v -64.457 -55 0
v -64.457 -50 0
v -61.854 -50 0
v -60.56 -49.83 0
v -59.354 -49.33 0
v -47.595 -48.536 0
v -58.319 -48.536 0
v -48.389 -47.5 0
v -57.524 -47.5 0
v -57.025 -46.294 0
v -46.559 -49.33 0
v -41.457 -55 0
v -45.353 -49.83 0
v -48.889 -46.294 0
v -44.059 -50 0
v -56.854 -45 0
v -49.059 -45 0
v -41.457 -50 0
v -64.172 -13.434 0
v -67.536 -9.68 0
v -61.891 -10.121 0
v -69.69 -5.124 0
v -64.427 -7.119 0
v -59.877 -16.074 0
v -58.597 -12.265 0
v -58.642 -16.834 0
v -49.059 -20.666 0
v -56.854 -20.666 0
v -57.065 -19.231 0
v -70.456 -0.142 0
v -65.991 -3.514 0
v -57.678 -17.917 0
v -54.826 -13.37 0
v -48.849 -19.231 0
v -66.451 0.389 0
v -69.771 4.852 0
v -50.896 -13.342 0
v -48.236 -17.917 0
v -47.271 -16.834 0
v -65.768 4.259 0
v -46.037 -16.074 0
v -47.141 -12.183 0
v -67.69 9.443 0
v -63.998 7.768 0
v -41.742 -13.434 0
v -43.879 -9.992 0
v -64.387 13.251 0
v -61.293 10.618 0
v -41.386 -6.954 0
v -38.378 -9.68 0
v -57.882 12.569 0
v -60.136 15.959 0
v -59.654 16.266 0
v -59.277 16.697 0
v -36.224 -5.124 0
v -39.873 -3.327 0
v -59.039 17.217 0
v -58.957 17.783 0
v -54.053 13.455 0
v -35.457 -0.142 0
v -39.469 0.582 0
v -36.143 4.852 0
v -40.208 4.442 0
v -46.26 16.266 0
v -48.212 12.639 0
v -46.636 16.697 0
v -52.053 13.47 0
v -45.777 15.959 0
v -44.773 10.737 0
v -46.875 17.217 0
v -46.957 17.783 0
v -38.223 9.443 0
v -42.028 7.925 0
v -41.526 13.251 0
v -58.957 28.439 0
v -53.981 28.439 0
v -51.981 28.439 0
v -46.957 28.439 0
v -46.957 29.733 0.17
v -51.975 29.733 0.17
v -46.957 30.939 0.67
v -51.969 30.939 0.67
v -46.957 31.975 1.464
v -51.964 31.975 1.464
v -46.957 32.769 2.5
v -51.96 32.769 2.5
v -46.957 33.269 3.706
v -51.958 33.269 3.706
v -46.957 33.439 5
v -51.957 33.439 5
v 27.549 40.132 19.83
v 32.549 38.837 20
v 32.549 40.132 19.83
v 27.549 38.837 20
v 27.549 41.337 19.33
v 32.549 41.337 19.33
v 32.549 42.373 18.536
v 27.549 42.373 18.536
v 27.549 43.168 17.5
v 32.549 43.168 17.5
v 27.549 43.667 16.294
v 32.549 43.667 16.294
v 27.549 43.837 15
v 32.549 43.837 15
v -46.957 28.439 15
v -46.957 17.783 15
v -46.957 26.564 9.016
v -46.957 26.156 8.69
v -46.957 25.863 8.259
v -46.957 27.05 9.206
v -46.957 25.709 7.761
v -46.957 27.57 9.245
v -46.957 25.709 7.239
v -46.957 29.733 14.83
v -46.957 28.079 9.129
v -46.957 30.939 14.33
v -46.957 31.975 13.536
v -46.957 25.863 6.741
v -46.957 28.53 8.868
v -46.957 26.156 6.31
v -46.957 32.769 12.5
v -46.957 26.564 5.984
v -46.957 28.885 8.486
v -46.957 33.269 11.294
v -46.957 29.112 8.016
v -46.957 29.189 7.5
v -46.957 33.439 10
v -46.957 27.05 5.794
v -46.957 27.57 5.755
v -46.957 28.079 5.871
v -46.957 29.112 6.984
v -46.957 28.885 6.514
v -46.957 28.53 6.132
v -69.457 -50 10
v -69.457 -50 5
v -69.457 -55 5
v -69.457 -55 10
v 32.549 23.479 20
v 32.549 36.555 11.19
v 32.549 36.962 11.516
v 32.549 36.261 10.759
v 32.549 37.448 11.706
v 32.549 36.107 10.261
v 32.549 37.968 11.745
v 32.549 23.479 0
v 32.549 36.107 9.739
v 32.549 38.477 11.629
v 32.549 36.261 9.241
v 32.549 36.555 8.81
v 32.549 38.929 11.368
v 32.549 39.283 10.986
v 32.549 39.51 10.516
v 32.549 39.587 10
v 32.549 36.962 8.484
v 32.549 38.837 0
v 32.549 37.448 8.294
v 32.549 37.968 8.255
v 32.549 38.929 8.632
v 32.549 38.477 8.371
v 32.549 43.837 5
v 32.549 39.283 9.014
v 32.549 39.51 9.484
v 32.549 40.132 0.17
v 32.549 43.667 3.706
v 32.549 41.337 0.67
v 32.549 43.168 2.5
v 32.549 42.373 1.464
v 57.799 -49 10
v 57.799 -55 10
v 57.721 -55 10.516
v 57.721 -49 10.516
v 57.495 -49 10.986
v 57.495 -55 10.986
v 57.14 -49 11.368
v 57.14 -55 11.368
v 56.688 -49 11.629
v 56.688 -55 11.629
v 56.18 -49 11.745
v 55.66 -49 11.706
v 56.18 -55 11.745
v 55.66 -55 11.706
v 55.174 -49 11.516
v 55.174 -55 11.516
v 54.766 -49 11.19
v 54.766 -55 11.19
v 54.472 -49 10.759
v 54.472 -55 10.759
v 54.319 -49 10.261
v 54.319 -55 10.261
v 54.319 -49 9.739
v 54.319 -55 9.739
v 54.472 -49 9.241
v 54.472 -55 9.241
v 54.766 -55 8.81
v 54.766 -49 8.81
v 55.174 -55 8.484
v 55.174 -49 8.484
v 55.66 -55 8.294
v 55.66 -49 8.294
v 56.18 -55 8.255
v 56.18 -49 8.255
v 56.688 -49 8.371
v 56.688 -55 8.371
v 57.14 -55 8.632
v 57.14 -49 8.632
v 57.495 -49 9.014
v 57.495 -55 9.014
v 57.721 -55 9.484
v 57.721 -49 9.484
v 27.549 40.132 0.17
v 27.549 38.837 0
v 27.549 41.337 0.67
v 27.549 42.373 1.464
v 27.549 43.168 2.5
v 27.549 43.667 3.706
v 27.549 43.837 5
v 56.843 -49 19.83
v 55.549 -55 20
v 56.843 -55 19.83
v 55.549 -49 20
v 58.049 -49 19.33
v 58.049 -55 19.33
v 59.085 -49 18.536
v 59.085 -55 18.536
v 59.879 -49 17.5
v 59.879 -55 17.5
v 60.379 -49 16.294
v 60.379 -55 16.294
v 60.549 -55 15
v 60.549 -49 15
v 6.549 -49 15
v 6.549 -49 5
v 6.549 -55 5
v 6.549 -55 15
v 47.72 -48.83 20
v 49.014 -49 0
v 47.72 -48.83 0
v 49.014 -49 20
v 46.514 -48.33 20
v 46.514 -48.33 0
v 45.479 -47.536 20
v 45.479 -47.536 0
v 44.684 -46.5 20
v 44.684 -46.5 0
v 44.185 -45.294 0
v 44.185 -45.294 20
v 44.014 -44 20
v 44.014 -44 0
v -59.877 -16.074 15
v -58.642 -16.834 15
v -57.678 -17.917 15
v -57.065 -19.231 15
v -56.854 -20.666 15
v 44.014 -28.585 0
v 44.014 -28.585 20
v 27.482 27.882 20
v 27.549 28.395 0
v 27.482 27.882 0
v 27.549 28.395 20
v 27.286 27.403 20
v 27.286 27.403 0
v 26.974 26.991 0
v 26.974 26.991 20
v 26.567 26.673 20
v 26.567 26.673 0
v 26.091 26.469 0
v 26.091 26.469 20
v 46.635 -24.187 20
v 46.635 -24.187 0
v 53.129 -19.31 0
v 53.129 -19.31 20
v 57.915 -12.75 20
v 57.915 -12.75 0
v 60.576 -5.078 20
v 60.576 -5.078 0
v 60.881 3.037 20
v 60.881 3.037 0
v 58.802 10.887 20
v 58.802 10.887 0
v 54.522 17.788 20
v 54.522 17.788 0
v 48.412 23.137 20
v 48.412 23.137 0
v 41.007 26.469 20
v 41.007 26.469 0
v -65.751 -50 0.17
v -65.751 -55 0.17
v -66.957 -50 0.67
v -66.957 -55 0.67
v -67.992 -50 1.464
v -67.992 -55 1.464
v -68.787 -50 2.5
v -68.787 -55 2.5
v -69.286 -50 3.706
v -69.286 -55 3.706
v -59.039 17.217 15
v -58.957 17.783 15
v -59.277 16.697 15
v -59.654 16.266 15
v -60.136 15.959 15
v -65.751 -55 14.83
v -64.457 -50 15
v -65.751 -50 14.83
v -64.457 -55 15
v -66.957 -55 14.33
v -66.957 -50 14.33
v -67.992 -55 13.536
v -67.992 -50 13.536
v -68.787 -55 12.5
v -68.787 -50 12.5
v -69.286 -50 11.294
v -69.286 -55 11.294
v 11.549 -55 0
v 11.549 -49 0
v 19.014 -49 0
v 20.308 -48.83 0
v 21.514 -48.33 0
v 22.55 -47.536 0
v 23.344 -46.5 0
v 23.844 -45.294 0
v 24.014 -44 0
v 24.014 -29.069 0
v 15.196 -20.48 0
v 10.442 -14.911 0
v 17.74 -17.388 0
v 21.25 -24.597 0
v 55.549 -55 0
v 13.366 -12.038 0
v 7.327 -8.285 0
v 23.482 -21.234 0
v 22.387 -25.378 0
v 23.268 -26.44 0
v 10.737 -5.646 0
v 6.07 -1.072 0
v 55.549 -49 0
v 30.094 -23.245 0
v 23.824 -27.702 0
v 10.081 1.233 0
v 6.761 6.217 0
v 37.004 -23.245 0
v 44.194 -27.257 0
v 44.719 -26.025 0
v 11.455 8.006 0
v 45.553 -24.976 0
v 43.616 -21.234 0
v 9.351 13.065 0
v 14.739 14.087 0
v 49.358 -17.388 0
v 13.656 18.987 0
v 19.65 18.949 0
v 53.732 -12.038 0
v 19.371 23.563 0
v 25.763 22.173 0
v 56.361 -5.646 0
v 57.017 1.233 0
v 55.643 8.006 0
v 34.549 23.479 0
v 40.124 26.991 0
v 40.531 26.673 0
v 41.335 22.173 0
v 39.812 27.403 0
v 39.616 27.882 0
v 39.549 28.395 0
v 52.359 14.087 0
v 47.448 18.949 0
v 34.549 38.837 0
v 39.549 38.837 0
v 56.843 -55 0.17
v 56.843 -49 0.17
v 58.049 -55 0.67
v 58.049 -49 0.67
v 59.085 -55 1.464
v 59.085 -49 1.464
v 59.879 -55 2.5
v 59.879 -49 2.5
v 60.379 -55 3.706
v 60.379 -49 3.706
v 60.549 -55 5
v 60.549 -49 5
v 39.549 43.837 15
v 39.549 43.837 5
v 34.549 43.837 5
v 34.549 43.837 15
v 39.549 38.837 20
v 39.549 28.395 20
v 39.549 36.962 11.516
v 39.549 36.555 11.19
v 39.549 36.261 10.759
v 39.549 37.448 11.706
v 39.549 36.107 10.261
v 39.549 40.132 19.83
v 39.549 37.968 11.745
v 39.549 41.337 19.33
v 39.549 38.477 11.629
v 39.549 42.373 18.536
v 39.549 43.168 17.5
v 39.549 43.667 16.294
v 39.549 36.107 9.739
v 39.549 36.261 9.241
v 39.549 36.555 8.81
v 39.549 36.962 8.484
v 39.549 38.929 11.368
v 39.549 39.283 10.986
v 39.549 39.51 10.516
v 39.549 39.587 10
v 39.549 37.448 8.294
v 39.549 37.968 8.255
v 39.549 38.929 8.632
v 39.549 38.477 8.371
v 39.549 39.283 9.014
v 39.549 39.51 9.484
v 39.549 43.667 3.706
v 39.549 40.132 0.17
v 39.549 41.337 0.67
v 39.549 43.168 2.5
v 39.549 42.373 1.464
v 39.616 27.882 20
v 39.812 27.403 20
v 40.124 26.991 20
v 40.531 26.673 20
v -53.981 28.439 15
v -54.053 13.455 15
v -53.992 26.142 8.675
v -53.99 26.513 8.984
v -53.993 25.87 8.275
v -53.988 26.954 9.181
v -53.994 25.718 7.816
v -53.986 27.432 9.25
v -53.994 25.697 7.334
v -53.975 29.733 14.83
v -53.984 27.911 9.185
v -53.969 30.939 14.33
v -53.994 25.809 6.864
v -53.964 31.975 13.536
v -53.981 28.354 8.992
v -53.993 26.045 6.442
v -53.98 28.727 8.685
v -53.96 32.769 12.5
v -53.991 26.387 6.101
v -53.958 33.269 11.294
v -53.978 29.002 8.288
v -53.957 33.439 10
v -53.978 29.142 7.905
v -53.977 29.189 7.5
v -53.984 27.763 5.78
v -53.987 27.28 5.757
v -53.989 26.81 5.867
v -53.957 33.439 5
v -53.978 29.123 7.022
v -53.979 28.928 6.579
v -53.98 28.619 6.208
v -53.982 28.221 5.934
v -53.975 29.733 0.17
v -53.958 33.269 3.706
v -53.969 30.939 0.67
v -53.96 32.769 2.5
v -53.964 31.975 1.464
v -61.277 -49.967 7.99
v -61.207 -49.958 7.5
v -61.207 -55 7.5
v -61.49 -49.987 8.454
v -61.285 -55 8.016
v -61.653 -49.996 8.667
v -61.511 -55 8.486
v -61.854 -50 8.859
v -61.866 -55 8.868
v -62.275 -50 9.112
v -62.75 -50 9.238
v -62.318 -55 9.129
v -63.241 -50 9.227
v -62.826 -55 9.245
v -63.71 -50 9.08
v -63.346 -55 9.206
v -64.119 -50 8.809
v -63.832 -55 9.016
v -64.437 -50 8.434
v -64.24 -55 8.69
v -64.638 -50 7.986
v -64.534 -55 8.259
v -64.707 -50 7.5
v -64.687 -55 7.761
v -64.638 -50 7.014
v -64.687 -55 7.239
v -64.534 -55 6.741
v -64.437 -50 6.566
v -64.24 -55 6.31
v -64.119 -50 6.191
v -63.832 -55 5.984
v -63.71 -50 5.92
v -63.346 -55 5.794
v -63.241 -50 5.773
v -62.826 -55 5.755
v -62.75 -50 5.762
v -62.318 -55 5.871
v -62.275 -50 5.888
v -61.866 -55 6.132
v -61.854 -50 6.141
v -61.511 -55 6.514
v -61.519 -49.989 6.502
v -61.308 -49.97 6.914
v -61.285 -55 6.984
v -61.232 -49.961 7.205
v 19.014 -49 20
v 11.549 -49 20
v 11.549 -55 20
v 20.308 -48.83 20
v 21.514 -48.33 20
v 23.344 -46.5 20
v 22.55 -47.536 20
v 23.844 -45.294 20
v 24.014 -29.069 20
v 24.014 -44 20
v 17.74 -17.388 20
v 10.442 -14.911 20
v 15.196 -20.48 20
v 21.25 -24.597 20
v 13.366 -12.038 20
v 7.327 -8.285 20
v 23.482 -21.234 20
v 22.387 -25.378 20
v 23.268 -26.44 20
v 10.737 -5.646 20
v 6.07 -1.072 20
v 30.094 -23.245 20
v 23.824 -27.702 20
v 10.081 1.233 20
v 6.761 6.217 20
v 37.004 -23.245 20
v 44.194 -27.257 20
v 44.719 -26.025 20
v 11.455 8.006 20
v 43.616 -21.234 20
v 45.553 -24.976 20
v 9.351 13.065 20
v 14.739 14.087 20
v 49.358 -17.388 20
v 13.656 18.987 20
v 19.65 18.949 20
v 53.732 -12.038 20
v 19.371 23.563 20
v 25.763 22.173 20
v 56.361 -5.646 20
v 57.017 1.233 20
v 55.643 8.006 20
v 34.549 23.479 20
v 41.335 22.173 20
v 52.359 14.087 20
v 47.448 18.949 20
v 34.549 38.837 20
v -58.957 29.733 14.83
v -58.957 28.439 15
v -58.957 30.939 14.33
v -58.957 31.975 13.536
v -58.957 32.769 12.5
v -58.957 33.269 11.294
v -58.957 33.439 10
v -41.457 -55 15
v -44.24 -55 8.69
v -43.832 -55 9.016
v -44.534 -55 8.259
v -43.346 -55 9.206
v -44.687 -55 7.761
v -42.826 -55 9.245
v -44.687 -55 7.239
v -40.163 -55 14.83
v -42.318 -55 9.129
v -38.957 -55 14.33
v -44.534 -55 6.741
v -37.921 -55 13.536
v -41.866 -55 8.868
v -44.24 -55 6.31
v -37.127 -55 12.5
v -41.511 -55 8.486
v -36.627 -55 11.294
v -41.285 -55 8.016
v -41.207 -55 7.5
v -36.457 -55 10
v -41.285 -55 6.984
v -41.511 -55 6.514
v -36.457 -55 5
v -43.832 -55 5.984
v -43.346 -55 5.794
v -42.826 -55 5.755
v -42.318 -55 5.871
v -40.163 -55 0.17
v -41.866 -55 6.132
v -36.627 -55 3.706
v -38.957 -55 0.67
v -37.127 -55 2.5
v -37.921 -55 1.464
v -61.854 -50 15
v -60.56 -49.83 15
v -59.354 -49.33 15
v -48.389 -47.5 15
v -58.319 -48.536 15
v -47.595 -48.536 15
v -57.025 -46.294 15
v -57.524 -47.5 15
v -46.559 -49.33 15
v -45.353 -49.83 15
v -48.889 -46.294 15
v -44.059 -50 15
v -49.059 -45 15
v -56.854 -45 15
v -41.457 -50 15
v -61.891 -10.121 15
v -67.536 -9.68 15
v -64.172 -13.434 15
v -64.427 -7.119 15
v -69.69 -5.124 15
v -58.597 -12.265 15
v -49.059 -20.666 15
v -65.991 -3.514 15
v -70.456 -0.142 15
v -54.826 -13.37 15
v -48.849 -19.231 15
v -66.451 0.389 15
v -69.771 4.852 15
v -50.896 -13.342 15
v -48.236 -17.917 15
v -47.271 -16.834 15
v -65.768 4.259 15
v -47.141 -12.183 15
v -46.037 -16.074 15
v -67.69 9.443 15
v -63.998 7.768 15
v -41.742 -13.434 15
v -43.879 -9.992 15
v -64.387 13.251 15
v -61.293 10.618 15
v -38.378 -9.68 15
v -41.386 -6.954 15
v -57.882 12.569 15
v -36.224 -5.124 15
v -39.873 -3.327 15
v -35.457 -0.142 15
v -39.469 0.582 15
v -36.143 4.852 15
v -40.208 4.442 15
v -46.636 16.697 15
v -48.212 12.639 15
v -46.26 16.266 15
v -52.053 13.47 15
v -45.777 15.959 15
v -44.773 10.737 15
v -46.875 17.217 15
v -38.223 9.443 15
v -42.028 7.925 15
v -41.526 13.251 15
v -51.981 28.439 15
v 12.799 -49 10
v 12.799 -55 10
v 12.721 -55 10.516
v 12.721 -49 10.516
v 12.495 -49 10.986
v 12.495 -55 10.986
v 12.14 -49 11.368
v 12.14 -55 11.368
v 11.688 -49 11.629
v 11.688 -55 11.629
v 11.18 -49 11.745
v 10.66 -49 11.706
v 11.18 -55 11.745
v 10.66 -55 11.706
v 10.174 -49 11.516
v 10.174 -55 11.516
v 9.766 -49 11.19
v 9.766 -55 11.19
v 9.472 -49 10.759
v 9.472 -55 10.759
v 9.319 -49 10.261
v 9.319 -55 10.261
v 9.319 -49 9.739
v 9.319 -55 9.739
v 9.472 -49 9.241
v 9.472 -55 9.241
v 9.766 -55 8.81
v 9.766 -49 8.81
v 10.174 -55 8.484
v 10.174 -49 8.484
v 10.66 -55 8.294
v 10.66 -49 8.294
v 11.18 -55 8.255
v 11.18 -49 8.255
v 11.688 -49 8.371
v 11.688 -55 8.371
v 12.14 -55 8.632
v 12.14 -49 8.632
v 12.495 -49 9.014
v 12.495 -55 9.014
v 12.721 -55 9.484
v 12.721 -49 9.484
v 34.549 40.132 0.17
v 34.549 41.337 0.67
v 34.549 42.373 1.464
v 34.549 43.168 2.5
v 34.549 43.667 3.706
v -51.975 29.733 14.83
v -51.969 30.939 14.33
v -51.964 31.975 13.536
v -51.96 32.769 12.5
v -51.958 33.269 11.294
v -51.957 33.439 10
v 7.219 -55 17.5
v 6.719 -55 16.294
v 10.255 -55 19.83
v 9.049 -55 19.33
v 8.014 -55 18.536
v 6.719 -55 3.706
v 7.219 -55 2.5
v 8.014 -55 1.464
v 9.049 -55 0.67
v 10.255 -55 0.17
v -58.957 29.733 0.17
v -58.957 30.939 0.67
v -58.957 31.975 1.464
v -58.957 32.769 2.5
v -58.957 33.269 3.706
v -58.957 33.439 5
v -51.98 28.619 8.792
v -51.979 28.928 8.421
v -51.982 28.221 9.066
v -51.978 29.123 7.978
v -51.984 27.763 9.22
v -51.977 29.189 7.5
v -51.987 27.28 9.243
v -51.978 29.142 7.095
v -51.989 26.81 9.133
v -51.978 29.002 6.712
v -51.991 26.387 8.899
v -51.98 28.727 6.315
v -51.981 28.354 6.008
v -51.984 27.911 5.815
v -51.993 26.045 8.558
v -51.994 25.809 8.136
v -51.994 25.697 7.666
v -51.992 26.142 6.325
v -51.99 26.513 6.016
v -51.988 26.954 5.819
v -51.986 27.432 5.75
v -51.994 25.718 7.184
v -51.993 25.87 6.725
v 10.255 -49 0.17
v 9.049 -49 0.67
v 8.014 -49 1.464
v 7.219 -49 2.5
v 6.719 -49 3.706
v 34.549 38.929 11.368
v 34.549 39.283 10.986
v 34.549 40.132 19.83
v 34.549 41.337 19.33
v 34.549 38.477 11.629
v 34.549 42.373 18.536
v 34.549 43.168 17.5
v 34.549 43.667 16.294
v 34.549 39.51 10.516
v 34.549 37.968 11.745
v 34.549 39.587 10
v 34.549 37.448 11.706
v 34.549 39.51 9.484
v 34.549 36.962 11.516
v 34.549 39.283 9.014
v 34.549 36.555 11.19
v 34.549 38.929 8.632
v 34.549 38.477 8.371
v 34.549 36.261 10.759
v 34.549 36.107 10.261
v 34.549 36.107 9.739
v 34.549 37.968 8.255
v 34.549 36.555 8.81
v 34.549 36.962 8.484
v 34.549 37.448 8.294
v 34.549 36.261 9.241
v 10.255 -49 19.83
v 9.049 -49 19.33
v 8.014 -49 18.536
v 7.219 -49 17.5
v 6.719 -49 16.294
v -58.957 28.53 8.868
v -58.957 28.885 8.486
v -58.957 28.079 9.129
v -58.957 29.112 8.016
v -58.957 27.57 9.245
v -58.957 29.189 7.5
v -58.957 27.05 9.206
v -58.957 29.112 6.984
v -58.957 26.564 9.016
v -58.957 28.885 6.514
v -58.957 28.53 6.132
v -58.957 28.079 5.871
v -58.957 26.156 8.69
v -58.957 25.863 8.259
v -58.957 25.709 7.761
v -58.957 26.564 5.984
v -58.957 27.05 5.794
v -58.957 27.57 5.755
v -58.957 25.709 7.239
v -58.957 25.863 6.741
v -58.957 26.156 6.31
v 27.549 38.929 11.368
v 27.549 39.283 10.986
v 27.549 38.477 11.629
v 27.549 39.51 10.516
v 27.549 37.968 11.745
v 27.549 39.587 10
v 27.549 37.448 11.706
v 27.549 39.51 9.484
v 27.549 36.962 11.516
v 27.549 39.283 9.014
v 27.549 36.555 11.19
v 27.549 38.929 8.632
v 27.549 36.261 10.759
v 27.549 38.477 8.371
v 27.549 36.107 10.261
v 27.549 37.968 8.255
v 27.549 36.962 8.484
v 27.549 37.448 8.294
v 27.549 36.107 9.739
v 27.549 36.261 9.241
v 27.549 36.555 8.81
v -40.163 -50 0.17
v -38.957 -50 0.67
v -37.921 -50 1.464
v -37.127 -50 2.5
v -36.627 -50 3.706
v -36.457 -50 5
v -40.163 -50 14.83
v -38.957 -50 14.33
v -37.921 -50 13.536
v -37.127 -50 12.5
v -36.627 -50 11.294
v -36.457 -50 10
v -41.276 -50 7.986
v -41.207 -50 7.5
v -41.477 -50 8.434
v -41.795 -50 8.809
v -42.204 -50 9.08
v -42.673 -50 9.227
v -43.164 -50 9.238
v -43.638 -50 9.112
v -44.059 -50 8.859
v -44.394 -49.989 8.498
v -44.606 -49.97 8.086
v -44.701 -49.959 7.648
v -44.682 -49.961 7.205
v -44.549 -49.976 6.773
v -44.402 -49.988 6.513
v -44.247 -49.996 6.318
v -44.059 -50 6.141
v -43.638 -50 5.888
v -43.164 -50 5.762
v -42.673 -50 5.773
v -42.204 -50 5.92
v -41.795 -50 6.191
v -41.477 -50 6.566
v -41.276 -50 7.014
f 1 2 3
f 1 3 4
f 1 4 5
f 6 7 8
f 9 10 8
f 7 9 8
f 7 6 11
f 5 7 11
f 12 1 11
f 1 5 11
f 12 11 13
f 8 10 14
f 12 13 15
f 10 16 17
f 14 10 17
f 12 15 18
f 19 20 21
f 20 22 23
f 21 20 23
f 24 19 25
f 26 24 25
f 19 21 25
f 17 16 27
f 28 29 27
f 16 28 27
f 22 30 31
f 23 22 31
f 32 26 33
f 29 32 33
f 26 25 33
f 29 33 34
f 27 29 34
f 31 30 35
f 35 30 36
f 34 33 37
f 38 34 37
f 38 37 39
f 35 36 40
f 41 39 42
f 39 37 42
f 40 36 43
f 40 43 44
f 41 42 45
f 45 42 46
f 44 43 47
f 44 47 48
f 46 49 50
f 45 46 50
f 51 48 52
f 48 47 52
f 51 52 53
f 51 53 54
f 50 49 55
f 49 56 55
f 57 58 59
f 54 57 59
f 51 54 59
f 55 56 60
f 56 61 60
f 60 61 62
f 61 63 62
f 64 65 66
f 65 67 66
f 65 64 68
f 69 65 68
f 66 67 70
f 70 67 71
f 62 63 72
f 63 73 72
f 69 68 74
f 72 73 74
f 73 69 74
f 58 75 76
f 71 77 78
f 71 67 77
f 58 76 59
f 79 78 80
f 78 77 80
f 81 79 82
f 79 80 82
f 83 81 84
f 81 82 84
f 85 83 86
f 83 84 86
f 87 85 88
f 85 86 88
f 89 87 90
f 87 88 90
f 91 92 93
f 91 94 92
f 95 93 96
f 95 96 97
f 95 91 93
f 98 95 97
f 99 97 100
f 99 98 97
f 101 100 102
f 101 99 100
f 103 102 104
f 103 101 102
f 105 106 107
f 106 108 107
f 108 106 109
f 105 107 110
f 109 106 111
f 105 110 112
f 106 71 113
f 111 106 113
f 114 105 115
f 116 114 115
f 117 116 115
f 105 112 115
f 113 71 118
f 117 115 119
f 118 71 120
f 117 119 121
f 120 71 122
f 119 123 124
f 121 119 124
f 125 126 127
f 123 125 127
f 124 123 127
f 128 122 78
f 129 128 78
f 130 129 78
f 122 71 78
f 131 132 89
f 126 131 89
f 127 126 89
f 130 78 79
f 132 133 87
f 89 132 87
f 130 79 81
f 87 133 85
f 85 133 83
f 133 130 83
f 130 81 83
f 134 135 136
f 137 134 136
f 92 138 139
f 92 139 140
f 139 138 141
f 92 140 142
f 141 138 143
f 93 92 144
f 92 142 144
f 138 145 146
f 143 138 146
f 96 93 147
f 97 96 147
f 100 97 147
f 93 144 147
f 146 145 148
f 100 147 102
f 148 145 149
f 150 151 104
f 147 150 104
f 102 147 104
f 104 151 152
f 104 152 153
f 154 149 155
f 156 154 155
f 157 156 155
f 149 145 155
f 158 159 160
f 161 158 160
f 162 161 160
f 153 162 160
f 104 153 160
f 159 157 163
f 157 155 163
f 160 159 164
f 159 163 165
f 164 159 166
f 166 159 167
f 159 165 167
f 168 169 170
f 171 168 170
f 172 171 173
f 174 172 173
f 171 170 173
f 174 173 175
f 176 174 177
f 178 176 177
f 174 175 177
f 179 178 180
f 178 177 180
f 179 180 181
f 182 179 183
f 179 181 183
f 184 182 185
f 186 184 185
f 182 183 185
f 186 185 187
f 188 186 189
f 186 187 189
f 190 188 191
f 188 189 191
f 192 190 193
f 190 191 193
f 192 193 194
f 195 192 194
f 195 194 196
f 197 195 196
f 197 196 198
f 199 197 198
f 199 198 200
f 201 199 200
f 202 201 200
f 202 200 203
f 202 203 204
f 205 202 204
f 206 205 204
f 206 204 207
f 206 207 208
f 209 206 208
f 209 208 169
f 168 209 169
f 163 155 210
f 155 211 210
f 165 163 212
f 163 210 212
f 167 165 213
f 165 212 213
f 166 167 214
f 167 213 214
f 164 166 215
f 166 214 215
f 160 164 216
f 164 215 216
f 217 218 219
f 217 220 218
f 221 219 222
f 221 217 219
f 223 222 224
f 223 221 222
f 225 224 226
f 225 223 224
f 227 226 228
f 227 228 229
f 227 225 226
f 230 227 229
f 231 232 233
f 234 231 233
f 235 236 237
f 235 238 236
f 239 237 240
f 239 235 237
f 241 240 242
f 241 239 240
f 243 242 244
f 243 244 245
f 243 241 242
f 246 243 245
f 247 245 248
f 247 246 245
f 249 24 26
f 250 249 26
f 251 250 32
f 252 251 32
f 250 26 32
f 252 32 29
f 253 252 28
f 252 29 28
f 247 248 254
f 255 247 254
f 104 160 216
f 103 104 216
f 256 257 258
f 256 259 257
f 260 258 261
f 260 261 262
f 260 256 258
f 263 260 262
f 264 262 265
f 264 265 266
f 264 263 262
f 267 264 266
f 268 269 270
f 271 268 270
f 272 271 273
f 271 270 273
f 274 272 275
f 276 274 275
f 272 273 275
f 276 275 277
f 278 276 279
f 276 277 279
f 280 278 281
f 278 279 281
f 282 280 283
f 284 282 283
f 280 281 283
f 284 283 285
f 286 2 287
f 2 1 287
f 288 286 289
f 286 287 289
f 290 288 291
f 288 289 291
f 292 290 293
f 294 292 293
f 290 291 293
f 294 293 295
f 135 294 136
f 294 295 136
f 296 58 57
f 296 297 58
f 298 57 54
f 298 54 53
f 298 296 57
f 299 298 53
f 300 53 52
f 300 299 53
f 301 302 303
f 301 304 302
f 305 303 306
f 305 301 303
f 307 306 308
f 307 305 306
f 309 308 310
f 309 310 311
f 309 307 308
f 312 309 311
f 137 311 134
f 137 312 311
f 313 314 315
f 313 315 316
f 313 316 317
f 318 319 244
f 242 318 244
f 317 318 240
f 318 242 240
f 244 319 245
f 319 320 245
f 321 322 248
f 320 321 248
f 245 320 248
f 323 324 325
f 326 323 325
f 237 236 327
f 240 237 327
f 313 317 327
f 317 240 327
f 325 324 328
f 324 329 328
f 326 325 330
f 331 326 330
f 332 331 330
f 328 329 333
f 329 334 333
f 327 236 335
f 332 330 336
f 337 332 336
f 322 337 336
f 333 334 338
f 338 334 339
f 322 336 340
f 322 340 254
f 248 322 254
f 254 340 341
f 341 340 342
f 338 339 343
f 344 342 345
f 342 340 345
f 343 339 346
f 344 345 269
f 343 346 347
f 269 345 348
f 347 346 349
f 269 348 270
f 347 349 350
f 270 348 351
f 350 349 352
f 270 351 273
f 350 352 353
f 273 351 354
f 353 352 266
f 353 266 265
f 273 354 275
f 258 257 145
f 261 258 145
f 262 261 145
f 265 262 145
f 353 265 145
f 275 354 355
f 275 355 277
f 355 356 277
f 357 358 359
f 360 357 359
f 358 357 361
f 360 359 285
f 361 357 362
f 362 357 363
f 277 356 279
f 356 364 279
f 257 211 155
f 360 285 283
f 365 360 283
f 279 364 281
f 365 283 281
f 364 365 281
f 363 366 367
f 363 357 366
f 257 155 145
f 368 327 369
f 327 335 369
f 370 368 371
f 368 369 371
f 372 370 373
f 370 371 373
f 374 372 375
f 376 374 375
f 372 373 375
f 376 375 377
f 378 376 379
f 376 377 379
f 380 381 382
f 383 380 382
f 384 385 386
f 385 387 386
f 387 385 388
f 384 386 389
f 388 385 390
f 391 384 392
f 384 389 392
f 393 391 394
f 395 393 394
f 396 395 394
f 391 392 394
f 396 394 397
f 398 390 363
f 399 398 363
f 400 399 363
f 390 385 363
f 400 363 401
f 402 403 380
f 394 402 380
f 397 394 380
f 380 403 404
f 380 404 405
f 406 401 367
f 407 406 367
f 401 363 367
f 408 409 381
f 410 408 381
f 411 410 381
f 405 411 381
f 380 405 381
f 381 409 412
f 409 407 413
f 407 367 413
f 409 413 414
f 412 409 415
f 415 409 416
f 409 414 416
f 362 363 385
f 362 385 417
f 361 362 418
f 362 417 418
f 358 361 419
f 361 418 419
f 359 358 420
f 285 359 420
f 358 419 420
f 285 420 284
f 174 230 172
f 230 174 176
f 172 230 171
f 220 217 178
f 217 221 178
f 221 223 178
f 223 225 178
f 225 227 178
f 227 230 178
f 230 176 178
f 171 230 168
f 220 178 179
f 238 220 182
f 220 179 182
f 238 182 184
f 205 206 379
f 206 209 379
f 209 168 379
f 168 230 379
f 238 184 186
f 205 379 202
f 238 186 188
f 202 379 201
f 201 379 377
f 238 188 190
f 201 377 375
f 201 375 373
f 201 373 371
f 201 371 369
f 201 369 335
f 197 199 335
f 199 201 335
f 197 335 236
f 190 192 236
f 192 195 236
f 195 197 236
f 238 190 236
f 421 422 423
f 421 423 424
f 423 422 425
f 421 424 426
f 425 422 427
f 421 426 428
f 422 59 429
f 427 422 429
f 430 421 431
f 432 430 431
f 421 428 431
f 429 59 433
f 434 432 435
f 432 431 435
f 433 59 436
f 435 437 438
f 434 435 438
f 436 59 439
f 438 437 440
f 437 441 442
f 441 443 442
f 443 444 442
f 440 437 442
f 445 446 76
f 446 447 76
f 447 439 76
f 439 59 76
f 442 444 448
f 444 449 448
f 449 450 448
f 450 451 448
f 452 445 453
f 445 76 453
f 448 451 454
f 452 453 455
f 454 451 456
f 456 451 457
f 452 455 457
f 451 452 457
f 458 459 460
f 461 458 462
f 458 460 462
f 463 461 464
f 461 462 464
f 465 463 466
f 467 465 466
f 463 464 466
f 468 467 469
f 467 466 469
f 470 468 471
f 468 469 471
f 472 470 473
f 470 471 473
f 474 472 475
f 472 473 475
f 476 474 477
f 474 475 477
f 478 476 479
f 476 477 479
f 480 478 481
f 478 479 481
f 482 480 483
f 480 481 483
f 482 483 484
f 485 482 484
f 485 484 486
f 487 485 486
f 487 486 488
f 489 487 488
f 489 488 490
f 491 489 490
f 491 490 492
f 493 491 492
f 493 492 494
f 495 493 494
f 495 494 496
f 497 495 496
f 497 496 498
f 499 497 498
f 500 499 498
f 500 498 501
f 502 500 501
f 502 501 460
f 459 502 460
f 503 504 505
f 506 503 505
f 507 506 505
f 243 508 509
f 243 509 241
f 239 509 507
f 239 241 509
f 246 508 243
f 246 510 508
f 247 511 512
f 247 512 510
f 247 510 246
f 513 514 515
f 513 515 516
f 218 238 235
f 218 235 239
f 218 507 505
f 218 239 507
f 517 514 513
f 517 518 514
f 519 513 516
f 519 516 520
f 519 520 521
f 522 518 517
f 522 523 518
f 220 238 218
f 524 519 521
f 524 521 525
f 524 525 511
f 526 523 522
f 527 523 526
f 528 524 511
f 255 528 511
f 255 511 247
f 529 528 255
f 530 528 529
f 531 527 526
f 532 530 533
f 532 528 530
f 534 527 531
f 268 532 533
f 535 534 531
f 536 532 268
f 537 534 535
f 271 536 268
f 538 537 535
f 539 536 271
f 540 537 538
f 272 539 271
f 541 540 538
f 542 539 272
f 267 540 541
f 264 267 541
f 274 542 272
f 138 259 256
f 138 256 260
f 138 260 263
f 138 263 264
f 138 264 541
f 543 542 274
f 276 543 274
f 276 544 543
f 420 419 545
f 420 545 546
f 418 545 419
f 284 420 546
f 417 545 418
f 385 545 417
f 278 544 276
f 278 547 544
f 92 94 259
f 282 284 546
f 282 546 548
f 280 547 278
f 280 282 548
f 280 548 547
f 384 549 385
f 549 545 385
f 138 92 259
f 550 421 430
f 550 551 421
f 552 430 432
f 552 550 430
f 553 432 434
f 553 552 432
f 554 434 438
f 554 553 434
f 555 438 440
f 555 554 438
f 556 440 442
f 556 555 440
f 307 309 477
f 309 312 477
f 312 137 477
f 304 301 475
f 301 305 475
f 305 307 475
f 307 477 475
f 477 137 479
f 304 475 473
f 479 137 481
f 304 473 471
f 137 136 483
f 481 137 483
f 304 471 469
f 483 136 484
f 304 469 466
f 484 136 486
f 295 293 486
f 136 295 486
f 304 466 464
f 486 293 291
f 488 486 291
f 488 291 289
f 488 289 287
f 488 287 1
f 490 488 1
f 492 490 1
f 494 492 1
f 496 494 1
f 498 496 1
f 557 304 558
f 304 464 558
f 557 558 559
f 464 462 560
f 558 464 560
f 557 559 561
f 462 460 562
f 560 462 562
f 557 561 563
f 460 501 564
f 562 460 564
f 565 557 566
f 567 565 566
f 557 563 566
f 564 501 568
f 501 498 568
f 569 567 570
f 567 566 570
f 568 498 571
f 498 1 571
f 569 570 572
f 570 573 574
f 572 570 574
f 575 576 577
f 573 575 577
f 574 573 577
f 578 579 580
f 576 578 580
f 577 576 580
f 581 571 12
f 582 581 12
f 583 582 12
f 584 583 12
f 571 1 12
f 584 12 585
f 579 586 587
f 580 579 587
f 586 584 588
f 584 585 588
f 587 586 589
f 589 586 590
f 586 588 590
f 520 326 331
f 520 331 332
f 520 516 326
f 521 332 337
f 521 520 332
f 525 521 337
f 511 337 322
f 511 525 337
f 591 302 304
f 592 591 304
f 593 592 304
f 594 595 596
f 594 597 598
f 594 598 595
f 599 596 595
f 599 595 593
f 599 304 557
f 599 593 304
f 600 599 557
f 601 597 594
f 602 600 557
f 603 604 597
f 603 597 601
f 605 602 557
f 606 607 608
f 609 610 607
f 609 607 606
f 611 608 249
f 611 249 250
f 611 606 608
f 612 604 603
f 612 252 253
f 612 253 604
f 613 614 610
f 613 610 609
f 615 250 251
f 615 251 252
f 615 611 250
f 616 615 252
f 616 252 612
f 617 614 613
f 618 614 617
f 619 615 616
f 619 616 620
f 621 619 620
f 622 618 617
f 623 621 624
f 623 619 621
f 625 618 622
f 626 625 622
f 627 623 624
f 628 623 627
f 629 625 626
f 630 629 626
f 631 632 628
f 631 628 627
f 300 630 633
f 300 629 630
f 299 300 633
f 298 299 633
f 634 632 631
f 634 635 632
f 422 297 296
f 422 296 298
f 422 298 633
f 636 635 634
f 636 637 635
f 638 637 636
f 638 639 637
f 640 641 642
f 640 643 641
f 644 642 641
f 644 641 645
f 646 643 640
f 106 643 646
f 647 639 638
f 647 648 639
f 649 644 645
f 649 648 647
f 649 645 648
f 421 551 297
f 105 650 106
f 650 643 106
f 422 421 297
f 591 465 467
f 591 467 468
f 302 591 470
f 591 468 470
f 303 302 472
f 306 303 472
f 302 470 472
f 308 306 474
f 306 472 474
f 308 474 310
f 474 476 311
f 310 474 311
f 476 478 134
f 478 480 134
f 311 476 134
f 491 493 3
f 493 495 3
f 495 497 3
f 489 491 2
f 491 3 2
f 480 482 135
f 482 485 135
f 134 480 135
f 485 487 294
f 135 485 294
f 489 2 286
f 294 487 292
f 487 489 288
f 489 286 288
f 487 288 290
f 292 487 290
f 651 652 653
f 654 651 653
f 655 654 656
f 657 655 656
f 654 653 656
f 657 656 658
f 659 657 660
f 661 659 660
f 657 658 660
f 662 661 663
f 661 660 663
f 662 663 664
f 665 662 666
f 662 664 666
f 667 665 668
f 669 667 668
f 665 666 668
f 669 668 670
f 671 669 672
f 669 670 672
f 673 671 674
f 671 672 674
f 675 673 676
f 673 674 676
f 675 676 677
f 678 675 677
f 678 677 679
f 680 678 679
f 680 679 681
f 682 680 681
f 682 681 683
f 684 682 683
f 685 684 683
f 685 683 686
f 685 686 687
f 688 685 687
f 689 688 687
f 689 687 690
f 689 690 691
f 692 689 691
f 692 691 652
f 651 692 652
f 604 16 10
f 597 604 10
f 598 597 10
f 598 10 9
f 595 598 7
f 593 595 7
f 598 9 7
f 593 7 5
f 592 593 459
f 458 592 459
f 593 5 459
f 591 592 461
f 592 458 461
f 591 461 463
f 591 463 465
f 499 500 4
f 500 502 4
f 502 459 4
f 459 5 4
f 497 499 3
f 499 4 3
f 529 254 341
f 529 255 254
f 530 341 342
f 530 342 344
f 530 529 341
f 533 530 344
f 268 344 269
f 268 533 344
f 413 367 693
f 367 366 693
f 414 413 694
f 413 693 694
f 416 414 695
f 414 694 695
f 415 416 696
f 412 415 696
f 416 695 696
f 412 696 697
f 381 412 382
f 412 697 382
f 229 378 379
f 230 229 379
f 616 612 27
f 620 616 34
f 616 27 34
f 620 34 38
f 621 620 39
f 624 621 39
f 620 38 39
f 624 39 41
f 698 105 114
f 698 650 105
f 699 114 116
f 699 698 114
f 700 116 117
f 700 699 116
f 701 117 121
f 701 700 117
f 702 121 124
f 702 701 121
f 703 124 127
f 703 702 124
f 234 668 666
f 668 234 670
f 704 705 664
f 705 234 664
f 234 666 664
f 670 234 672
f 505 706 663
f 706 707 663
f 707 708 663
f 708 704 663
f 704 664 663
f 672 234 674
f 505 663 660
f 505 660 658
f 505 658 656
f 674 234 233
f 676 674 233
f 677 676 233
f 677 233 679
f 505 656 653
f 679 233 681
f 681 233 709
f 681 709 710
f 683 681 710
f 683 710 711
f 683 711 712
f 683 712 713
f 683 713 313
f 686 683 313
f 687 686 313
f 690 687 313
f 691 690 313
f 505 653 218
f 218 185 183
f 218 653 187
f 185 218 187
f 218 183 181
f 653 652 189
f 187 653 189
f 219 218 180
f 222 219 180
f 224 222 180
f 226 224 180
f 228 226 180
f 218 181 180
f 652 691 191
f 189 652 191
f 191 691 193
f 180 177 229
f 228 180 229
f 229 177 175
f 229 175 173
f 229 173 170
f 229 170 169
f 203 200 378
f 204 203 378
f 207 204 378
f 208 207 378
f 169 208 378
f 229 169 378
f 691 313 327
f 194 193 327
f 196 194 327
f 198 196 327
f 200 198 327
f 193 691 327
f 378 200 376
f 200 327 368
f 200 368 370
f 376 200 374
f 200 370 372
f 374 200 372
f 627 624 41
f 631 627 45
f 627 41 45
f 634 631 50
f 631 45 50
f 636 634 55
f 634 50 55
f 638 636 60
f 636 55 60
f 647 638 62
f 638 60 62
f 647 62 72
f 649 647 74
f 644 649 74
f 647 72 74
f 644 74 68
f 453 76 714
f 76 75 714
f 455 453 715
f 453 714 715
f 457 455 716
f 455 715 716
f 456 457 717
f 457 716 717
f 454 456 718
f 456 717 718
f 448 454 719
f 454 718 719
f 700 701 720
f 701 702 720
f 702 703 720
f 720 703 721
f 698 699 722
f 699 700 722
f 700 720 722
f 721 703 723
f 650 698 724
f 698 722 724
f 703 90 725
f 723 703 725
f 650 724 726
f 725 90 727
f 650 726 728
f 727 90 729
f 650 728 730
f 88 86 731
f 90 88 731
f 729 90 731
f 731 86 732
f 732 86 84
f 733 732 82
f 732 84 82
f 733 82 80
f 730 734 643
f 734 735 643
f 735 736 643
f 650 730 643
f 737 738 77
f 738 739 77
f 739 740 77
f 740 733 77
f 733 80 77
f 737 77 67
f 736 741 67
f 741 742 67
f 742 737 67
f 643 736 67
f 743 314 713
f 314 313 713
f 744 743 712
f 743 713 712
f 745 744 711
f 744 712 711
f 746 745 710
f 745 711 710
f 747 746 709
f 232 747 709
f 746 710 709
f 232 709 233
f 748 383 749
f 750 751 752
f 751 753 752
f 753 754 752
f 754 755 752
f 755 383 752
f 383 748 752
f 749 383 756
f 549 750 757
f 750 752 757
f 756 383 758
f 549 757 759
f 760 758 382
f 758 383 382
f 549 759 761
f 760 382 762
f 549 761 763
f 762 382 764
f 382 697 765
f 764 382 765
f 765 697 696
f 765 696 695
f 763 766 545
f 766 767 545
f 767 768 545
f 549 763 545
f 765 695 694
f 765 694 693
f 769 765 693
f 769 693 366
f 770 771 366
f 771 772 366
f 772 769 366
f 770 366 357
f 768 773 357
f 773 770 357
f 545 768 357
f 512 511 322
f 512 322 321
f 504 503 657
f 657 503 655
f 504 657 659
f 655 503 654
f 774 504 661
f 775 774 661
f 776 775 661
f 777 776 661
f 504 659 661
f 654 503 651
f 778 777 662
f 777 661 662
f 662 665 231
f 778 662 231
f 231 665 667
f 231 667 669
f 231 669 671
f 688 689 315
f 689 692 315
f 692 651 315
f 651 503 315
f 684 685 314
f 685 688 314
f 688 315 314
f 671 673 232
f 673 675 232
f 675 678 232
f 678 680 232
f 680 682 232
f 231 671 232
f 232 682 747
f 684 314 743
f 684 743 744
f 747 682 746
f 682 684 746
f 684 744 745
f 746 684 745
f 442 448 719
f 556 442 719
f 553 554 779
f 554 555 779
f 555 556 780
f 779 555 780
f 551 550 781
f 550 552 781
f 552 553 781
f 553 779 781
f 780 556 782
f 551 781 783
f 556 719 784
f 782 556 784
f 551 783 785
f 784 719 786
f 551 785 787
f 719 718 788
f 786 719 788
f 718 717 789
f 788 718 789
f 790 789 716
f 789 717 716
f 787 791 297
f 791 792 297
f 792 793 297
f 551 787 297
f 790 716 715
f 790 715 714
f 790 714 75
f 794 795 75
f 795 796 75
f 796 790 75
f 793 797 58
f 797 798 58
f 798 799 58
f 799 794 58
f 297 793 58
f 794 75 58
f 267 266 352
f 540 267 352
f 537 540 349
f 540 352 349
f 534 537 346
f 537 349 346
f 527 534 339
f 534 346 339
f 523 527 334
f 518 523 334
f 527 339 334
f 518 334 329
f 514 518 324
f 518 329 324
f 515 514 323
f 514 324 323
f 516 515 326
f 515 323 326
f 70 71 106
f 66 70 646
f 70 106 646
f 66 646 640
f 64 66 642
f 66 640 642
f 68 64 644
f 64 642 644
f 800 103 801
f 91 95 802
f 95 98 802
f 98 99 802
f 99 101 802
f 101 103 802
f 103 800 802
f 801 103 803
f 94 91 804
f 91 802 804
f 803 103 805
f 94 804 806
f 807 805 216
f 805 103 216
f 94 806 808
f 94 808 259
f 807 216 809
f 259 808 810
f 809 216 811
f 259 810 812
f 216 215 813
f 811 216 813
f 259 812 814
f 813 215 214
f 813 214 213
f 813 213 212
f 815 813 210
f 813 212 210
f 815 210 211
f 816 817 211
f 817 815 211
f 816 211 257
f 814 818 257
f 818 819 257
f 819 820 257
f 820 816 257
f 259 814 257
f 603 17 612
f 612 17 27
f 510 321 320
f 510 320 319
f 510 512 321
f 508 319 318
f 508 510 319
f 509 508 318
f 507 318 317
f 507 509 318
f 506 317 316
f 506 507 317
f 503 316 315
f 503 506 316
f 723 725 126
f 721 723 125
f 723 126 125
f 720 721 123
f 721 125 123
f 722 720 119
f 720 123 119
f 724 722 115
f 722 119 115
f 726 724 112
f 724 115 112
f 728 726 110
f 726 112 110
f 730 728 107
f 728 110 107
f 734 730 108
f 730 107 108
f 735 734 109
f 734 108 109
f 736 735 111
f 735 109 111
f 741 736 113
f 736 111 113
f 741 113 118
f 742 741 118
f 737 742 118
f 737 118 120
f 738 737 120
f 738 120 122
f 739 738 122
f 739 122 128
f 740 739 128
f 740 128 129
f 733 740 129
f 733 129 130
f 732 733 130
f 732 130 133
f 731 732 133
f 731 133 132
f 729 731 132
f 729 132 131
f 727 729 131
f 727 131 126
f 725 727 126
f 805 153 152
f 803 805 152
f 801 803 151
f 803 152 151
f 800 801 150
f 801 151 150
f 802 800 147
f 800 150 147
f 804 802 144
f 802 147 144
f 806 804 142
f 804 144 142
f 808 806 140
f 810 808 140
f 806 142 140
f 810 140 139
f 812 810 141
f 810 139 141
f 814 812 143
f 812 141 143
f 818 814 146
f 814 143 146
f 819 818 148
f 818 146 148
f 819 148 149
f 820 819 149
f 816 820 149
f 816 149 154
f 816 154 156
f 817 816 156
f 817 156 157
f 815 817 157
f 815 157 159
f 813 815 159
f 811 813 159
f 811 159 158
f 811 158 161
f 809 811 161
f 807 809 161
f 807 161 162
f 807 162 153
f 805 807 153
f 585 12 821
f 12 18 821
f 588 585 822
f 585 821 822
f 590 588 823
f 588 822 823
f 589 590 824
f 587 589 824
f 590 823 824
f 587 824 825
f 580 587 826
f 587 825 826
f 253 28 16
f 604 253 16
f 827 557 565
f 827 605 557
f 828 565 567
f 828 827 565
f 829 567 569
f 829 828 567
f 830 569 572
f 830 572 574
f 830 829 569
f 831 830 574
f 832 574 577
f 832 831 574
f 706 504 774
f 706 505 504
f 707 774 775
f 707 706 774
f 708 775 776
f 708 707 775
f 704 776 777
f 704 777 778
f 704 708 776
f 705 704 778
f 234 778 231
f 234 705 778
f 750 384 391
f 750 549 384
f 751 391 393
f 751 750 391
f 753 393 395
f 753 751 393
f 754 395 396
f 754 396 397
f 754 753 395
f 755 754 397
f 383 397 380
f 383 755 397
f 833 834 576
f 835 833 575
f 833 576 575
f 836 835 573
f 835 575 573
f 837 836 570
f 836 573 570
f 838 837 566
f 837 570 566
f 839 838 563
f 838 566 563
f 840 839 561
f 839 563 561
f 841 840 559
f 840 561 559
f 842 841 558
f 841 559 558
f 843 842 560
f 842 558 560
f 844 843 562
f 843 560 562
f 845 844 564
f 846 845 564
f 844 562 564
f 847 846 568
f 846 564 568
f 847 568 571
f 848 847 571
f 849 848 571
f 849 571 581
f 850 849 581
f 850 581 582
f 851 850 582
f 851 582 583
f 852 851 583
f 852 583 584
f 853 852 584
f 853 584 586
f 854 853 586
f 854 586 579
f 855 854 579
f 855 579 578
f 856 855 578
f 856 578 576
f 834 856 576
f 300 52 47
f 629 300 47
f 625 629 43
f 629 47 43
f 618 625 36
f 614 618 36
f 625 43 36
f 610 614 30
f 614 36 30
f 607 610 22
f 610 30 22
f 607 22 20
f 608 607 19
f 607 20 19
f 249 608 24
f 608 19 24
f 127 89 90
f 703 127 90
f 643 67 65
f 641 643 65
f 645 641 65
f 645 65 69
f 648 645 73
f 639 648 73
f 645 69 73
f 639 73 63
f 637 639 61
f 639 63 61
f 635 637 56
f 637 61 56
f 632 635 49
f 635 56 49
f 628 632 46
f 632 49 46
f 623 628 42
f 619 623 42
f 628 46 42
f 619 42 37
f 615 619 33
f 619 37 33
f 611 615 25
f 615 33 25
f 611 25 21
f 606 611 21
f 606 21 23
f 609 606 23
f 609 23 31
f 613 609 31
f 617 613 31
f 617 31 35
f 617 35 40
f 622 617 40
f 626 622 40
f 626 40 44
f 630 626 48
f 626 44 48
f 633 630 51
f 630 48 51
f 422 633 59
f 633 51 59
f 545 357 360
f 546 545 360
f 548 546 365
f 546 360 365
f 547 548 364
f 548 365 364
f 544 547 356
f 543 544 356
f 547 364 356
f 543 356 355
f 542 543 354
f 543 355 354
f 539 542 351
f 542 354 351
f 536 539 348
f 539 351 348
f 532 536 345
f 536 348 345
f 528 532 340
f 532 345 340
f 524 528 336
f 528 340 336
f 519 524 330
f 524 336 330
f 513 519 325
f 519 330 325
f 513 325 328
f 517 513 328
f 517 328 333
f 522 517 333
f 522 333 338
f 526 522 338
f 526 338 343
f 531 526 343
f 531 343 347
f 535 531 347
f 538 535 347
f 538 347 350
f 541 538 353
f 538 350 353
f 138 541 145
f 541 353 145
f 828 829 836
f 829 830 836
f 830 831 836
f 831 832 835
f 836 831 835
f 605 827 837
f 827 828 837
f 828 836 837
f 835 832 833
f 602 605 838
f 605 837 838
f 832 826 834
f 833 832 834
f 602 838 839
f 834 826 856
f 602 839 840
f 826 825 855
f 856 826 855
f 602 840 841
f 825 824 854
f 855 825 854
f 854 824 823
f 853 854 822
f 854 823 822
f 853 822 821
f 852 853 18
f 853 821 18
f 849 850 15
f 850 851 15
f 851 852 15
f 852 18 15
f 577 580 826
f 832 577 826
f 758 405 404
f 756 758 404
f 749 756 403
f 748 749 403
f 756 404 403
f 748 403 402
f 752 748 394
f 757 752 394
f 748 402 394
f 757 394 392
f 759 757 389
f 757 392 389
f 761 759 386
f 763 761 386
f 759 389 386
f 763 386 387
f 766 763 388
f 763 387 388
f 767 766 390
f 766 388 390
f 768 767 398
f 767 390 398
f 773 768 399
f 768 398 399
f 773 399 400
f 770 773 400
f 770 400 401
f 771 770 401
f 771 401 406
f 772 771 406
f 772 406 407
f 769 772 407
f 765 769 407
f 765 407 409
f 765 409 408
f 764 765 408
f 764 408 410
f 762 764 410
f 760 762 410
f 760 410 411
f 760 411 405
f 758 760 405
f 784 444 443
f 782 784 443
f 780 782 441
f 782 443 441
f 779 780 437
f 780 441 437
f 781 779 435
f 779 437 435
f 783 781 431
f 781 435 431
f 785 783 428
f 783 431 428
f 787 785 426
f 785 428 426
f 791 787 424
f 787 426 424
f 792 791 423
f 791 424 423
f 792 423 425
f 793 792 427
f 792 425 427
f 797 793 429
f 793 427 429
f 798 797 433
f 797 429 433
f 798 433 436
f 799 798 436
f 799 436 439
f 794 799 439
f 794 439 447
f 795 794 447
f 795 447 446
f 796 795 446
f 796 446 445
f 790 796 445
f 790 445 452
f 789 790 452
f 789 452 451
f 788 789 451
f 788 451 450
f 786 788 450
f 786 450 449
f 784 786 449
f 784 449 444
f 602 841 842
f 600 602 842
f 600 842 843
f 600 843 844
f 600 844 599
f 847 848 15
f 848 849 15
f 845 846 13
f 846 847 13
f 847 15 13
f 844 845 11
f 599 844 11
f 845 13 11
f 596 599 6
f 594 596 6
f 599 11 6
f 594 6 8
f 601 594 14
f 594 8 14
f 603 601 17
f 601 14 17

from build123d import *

# Parameters (mm, degrees)
F1_DEPTH  = 15
F2_R      = 1.75
F3_DEPTH  = 25
F4_R      = 1.75
F5_DEPTH  = 25
F6_R      = 5
F8_DEPTH  = 20
F9_R      = 1.75
F10_DEPTH = 25
F11_R     = 1.75
F12_DEPTH = 25
F13_R     = 5
F14_R     = 2
F14_2_R   = 2
F15_R     = 5


with BuildPart() as f1:
    # F0 (on Top) → F1 (new body)
    with BuildSketch(Plane.XY):
        with BuildLine():
            ThreePointArc((-52.053306, 13.469729), (-52.860094, -13.499653), (-54.053375, 13.455394))
            Line((-54.053375, 13.455394), (-53.95685, 33.439282))
            Line((-53.95685, 33.439282), (-58.95685, 33.439282))
            Line((-58.95685, 33.439282), (-58.95685, 16.439282))
            ThreePointArc((-58.95685, 16.439282), (-70.449843, 0.495167), (-59.877178, -16.073552))
            ThreePointArc((-59.877178, -16.073552), (-57.677922, -17.917012), (-56.854415, -20.665995))
            Line((-56.854415, -20.665995), (-56.854415, -45))
            ThreePointArc((-56.854415, -45), (-58.318881, -48.535534), (-61.854415, -50))
            Line((-61.854415, -50), (-69.45685, -50))
            Line((-69.45685, -50), (-69.45685, -55))
            Line((-69.45685, -55), (-36.45685, -55))
            Line((-36.45685, -55), (-36.45685, -50))
            Line((-36.45685, -50), (-44.059286, -50))
            ThreePointArc((-44.059286, -50), (-47.59482, -48.535534), (-49.059286, -45))
            Line((-49.059286, -45), (-49.059286, -20.665995))
            ThreePointArc((-49.059286, -20.665995), (-48.235778, -17.917012), (-46.036522, -16.073552))
            ThreePointArc((-46.036522, -16.073552), (-35.463857, 0.495167), (-46.95685, 16.439282))
            Line((-46.95685, 16.439282), (-46.95685, 33.439282))
            Line((-46.95685, 33.439282), (-51.95685, 33.439282))
            Line((-51.95685, 33.439282), (-52.053306, 13.469729))
        make_face()
    extrude(amount=F1_DEPTH)

    # F2 (on face) → F3 (cut)
    with BuildSketch(Plane.XZ.offset(55)):
        with Locations((-62.95685, 7.5)):
            Circle(F2_R)
        with Locations((-42.95685, 7.5)):
            Circle(F2_R)
    extrude(amount=-F3_DEPTH, mode=Mode.SUBTRACT)

    # F4 (on face) → F5 (cut)
    with BuildSketch(Plane.YZ.offset(-46.95685)):
        with Locations((27.439282, 7.5)):
            Circle(F4_R)
    extrude(amount=-F5_DEPTH, mode=Mode.SUBTRACT)

    # F6
    f6_edges = [f1.edges().sort_by_distance(p)[0] for p in [
        (-49.45685, 33.439282, 15),
        (-56.45685, 33.439282, 15),
        (-49.45685, 33.439282, 0),
        (-56.45685, 33.439282, 0),
        (-36.45685, -52.5, 15),
        (-36.45685, -52.5, 0),
        (-69.45685, -52.5, 15),
        (-69.45685, -52.5, 0),
    ]]
    fillet(f6_edges, radius=F6_R)

    # F14#2
    f14_2_edges = [f1.edges().sort_by_distance(p)[0] for p in [
        (-58.95685, 16.439282, 7.5),
        (-46.95685, 16.439282, 7.5),
    ]]
    fillet(f14_2_edges, radius=F14_2_R)


with BuildPart() as f8:
    # F7 (on Top) → F8 (new body)
    with BuildSketch(Plane.XY):
        with BuildLine():
            ThreePointArc((34.54904, 23.478714), (33.54904, -23.5), (32.54904, 23.478714))
            Line((32.54904, 23.478714), (32.54904, 43.837474))
            Line((32.54904, 43.837474), (27.54904, 43.837474))
            Line((27.54904, 43.837474), (27.54904, 26.837474))
            ThreePointArc((27.54904, 26.837474), (6.110848, 1.842729), (24.014337, -25.794175))
            ThreePointArc((24.014337, -25.794175), (34.048544, -27.495463), (44.014337, -25.430839))
            ThreePointArc((44.014337, -25.430839), (60.949234, 2.340807), (39.54904, 26.837474))
            Line((39.54904, 26.837474), (39.54904, 43.837474))
            Line((39.54904, 43.837474), (34.54904, 43.837474))
            Line((34.54904, 43.837474), (34.54904, 23.478714))
        make_face()
        with BuildLine():
            ThreePointArc((44.014337, -25.430839), (34.048544, -27.495463), (24.014337, -25.794175))
            Line((24.014337, -25.794175), (24.014337, -49))
            Line((24.014337, -49), (6.54904, -49))
            Line((6.54904, -49), (6.54904, -55))
            Line((6.54904, -55), (60.54904, -55))
            Line((60.54904, -55), (60.54904, -49))
            Line((60.54904, -49), (44.014337, -49))
            Line((44.014337, -49), (44.014337, -25.430839))
        make_face()
    extrude(amount=F8_DEPTH)

    # F9 (on face) → F10 (cut)
    with BuildSketch(Plane.YZ.offset(39.54904)):
        with Locations((37.837474, 10)):
            Circle(F9_R)
    extrude(amount=-F10_DEPTH, mode=Mode.SUBTRACT)

    # F11 (on face) → F12 (cut)
    with BuildSketch(Plane.XZ.offset(55)):
        with Locations((56.04904, 10)):
            Circle(F11_R)
        with Locations((11.04904, 10)):
            Circle(F11_R)
    extrude(amount=-F12_DEPTH, mode=Mode.SUBTRACT)

    # F13
    f13_edges = [f8.edges().sort_by_distance(p)[0] for p in [
        (44.014337, -49, 10),
        (44.014337, -25.430839, 10),
        (60.54904, -52, 20),
        (37.04904, 43.837474, 20),
        (30.04904, 43.837474, 20),
        (60.54904, -52, 0),
        (37.04904, 43.837474, 0),
        (30.04904, 43.837474, 0),
        (6.54904, -52, 0),
        (6.54904, -52, 20),
        (24.014337, -25.794175, 10),
    ]]
    fillet(f13_edges, radius=F13_R)

    # F14
    f14_edges = [f8.edges().sort_by_distance(p)[0] for p in [
        (27.54904, 26.837474, 10),
        (39.54904, 26.837474, 10),
    ]]
    fillet(f14_edges, radius=F14_R)

    # F15
    f15_edges = [f8.edges().sort_by_distance(p)[0] for p in [
        (24.014337, -49, 10),
    ]]
    fillet(f15_edges, radius=F15_R)


solid = Compound([f1.part, f8.part])
